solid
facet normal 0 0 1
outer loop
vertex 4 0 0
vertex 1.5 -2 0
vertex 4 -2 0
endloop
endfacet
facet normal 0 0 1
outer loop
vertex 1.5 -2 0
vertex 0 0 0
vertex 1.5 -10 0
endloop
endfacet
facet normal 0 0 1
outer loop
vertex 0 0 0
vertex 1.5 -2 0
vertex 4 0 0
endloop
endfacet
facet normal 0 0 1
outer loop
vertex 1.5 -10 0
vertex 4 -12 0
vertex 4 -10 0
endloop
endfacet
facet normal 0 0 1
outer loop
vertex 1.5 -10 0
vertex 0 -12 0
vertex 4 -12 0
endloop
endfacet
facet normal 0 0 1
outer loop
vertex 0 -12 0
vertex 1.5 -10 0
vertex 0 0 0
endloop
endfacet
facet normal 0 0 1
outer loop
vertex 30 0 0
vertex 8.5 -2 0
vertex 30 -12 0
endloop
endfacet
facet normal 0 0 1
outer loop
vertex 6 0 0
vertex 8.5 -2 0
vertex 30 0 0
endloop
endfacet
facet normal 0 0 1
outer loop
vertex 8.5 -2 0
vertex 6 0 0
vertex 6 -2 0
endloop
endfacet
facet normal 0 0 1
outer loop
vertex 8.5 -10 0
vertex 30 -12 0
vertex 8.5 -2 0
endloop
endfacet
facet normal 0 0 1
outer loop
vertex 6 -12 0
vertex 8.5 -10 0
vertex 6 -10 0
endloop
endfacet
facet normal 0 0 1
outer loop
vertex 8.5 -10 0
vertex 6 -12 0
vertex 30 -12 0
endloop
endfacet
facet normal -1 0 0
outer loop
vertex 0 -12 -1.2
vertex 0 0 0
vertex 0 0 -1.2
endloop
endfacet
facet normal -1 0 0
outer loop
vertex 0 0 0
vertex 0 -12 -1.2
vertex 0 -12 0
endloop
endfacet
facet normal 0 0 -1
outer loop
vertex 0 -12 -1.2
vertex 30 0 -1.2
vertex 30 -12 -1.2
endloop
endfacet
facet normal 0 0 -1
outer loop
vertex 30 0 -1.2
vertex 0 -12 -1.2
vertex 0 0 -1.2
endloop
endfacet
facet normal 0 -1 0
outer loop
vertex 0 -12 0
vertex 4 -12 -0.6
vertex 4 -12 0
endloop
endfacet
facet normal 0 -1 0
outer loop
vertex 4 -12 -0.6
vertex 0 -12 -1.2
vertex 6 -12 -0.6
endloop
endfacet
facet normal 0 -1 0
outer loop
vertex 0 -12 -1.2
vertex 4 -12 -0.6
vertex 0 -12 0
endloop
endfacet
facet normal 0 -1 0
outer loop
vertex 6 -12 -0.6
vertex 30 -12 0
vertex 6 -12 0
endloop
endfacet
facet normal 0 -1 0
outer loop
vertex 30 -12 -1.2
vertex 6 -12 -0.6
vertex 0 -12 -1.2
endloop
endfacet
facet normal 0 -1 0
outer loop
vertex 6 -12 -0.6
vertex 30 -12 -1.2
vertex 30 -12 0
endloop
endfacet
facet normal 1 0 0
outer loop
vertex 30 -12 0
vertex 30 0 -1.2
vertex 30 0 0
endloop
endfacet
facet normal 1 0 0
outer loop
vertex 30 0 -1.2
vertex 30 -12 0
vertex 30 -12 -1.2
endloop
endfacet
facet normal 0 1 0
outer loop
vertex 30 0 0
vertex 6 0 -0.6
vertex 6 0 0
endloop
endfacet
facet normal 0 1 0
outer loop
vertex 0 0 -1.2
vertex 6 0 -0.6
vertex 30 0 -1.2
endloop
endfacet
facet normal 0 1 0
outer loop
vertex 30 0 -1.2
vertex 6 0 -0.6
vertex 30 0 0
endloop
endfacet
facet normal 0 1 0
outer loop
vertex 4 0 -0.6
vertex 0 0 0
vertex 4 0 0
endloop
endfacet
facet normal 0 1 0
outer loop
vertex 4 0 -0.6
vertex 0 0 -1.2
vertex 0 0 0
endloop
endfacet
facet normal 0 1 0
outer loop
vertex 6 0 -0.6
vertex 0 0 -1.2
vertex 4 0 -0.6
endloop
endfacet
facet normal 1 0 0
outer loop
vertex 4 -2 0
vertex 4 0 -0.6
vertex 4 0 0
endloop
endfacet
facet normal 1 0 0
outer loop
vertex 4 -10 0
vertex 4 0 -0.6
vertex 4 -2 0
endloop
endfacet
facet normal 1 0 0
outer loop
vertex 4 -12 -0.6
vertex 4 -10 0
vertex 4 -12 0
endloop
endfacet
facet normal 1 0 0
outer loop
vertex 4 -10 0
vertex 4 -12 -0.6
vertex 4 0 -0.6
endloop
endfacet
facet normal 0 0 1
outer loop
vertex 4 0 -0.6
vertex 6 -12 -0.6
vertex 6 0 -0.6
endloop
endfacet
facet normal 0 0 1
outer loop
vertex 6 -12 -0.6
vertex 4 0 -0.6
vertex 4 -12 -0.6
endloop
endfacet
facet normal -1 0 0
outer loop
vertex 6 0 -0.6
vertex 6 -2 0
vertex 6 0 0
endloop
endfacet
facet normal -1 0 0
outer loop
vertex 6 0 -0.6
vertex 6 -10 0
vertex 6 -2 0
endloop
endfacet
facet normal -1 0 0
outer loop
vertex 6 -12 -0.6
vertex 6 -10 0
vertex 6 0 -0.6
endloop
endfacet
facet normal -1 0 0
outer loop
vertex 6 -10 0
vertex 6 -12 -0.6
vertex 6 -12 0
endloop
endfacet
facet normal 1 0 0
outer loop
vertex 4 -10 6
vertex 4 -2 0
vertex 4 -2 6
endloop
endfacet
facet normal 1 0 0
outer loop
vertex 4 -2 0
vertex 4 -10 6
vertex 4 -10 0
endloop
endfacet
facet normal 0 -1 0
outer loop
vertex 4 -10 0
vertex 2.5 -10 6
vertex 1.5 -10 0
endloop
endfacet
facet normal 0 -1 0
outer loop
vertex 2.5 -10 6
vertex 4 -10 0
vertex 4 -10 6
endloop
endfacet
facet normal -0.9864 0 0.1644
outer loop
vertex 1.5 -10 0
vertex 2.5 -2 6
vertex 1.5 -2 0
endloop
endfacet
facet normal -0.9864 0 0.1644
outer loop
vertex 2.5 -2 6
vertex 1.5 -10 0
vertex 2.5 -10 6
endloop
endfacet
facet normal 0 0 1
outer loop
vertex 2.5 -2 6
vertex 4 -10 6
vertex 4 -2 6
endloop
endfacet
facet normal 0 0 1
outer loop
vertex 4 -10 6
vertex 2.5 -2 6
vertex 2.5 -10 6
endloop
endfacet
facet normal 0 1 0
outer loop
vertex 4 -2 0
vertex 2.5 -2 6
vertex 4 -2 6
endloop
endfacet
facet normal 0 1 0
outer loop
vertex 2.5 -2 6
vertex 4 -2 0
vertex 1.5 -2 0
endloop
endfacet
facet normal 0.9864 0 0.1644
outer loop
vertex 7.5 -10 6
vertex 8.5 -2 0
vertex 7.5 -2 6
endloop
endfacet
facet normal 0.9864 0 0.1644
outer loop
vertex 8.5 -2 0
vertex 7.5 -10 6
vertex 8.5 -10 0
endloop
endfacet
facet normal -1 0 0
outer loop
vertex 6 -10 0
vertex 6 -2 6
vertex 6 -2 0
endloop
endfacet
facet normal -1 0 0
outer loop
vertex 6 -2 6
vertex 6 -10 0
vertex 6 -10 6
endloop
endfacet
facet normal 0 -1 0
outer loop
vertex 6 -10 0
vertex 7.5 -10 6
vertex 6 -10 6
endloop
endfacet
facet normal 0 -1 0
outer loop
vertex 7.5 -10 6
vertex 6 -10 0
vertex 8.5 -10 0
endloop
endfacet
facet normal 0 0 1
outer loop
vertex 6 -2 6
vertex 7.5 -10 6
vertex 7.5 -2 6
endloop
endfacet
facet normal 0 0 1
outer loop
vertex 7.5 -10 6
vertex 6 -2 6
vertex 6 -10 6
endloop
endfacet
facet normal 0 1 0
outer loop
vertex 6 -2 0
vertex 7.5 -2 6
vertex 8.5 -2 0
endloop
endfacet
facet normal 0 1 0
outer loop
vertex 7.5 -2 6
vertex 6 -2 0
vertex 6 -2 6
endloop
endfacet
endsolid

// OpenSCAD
// Label Clip for Small Parts bin

face_width = 30;
face_height = 12;
face_thick=1.2;
fit_wall = 2;
tab_width = 2.5;
tab_depth = 6;
tab_position = 5;
/* [Hidden] */
tab_pts_left = [[tab_position-tab_width-fit_wall/2,0],[tab_position-fit_wall/2,0],[tab_position-fit_wall/2,tab_depth],[tab_position-tab_width,tab_depth]];
tab_pts_right = [[tab_position+fit_wall/2,0],[tab_position+tab_width+fit_wall/2,0],[tab_position+tab_width,tab_depth],[tab_position+fit_wall/2,tab_depth]];

rotate([-180,0,0])
difference(){
linear_extrude(height = face_thick)
            square([face_width, face_height]);
linear_extrude(height = face_thick/2)
translate([tab_position-fit_wall/2,-0.010,0])
            square([fit_wall,face_height+0.01]);
}
rotate([90,0,0]) difference(){linear_extrude(height = face_height/1.2) translate([0,0,face_height]) polygon(points=tab_pts_left);
    linear_extrude(height = face_height - face_height/1.2) translate([0,0,face_height]) polygon(points=tab_pts_left);
    }
rotate([90,0,0]) difference(){linear_extrude(height = face_height/1.2) polygon(points=tab_pts_right);linear_extrude(height = face_height-face_height/1.2) polygon(points=tab_pts_right);
}

//translate([tab_position-tab_width-fit_wall/2, 0, 0])
//        linear_extrude(height = tab_depth)
//            square([tab_width, height]);
//translate([tab_position+fit_wall/2, 0, 0])
//        linear_extrude(height = tab_depth)
//            square([tab_width, height]);
